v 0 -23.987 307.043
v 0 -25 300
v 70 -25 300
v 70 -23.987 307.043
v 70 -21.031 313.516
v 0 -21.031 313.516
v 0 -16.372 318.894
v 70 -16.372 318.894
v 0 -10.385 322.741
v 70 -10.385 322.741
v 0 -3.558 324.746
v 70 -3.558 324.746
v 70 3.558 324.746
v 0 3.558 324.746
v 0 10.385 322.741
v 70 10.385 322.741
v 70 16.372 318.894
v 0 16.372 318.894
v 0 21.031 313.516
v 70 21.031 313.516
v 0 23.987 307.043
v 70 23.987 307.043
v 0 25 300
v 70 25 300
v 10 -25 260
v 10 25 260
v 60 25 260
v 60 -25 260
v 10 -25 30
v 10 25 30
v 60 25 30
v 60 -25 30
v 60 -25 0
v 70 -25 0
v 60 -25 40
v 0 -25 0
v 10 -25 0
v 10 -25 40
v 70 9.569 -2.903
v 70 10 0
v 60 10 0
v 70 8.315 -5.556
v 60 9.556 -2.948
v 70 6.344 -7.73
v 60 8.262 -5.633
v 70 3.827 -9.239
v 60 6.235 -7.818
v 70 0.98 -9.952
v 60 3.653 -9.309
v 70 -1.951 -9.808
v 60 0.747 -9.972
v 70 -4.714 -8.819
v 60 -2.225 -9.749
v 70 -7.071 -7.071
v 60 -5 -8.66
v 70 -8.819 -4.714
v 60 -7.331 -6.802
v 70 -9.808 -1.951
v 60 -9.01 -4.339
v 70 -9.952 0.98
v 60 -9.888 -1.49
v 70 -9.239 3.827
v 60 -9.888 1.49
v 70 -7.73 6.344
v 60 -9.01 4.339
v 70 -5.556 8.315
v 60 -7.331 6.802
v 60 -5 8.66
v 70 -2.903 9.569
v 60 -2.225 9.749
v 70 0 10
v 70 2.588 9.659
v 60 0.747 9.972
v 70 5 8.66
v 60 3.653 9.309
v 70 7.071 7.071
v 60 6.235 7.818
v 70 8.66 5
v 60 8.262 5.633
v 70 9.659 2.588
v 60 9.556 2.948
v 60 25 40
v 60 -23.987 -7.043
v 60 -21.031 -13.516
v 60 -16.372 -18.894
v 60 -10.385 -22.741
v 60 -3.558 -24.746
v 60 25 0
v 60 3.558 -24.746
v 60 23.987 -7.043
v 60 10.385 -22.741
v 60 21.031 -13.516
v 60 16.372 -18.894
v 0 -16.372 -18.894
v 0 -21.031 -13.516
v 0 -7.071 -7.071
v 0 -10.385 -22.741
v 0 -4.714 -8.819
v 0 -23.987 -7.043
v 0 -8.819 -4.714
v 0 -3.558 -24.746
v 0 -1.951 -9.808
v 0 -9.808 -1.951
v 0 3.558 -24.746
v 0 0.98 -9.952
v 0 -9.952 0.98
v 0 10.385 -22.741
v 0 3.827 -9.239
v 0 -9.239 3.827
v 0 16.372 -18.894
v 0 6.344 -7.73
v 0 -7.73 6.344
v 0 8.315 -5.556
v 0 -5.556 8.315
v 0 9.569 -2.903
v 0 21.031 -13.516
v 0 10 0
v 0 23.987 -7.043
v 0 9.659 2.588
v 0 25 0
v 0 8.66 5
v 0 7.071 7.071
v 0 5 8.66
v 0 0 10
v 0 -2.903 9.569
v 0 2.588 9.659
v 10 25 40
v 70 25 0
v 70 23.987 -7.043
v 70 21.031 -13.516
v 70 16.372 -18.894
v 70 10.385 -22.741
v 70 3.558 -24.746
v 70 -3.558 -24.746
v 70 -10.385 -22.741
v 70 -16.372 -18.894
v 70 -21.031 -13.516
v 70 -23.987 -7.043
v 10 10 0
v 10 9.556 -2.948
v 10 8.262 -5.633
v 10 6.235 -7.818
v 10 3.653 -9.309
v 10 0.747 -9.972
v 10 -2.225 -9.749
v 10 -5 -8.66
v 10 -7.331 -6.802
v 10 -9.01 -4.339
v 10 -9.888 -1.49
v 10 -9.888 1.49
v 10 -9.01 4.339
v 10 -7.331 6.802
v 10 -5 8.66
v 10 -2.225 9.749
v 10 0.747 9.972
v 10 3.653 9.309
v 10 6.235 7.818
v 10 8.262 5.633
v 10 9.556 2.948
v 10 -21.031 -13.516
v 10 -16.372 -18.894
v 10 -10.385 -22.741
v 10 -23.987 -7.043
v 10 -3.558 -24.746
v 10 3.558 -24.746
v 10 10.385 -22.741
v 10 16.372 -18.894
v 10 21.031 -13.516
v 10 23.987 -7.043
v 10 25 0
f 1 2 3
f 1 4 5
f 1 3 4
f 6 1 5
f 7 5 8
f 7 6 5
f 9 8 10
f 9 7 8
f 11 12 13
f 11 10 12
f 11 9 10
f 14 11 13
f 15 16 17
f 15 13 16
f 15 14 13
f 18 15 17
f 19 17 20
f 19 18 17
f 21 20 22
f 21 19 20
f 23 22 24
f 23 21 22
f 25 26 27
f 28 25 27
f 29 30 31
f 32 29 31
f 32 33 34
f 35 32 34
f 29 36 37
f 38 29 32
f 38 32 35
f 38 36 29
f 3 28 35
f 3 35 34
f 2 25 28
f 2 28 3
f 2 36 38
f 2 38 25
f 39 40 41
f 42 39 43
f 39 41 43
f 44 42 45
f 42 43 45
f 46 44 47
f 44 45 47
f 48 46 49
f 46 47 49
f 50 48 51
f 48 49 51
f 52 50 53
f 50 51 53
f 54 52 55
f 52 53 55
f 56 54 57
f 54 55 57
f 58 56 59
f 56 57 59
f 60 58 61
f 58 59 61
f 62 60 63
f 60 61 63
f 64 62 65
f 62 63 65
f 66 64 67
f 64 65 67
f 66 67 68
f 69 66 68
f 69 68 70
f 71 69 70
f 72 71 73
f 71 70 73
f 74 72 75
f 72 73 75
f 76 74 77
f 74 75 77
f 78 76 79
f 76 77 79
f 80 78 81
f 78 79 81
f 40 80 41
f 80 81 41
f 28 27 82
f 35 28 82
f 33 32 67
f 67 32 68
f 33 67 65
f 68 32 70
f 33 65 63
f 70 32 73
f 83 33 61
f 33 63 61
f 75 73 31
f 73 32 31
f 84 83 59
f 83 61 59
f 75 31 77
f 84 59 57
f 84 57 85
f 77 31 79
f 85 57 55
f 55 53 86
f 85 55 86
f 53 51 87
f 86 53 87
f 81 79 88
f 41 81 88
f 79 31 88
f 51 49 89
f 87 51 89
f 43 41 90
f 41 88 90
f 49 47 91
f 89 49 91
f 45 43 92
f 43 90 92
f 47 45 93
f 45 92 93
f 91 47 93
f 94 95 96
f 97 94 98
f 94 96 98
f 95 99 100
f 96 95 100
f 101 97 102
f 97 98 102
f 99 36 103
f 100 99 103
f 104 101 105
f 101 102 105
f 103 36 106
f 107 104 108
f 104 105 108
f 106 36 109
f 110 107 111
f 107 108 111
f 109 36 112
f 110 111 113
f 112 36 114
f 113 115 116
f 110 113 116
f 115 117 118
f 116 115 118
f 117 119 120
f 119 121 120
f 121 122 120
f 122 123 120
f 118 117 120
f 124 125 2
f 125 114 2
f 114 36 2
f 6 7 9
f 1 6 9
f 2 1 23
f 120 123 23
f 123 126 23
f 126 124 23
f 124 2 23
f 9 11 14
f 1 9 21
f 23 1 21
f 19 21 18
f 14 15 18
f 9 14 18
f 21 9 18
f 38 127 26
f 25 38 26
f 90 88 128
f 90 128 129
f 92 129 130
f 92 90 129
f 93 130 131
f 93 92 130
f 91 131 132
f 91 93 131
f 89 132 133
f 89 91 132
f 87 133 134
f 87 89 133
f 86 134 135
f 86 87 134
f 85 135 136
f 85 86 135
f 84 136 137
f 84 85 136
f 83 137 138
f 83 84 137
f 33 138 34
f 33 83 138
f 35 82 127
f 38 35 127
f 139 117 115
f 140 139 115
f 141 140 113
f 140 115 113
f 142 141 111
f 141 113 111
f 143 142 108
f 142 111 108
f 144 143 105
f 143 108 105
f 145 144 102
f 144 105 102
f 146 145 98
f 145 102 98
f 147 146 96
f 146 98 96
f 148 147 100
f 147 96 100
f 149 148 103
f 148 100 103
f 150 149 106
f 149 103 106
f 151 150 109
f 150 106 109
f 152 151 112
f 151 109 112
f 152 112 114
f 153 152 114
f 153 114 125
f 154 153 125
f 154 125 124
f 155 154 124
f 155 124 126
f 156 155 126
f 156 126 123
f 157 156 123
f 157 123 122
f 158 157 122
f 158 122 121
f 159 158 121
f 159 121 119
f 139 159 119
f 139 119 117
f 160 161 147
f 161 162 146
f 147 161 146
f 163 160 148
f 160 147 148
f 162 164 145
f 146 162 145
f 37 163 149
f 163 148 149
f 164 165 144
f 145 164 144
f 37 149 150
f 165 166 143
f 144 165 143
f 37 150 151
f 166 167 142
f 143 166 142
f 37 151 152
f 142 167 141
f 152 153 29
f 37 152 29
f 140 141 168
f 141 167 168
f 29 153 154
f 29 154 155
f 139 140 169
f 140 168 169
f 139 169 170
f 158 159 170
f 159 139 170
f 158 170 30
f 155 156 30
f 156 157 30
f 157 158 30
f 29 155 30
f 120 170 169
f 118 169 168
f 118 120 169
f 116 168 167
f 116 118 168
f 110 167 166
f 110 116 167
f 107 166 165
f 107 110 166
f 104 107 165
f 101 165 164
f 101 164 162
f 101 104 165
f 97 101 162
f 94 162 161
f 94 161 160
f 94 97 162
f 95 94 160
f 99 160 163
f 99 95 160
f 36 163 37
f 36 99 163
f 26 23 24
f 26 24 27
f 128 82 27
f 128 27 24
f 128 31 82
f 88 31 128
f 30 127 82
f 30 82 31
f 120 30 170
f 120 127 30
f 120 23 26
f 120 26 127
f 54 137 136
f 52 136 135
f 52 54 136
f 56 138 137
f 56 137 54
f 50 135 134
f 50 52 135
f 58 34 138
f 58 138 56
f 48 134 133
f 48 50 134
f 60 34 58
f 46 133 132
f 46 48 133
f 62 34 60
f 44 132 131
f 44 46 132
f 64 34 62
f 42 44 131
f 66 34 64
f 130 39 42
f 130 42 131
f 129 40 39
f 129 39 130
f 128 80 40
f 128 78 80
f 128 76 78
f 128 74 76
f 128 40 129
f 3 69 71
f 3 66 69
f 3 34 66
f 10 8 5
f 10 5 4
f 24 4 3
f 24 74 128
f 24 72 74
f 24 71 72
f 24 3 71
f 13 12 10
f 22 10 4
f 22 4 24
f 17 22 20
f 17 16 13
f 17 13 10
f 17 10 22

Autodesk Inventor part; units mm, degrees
ref_plane "YZ Plane" through (0, 0, 0) normal (1, 0, 0) x (0, 1, 0)
ref_plane "XZ Plane" through (0, 0, 0) normal (0, 1, 0) x (-1, 0, 0)
ref_plane "XY Plane" through (0, 0, 0) normal (0, 0, 1) x (1, 0, 0)
sketch "Sketch1" plane through (0, 0, 0) normal (1, 0, 0) x (0, 1, 0)
  line L0 (0, 0) -> (0, 300)
  circle A0 centre (0, 300) radius 25
  circle A1 centre (0, 0) radius 25
  circle A2 centre (0, 300) radius 10
  circle A3 centre (0, 0) radius 10
  line L1 (25, 300) -> (25, 0)
  line L2 (-25, 0) -> (-25, 300)
  dimension "d0" = 300
  dimension "d1" = 50
  dimension "d2" = 20
extrude "Extrusion1" add sketch "Sketch1" along normal blind 70 contours A1 | A1 L2 A0 L0 | L0 A0 L1 A1 | A2 | A0
sketch "Sketch2" plane through (0, 25, 300) normal (0, 1, 0) x (1, 0, 0)
  line L0 (0, -25) -> (0, 0) projected
  line L1 (70, 300) -> (70, 325) projected
  line L2 (0, 0) -> (70, 0)
  line L3 (70, 0) -> (70, 300)
  line L4 (70, 300) -> (0, 300)
  line L5 (0, 300) -> (0, 0)
  line L6 (10, 10) -> (60, 10)
  line L7 (60, 10) -> (60, 290)
  line L8 (60, 290) -> (10, 290)
  line L9 (10, 290) -> (10, 10)
  line L10 (0, 325) -> (70, 325) projected
  line L11 (10, 290) -> (60, 290)
  line L12 (60, 290) -> (60, 325)
  line L13 (60, 325) -> (10, 325)
  line L14 (10, 325) -> (10, 290)
  line L15 (0, -25) -> (70, -25) projected
  line L16 (10, 10) -> (60, 10)
  line L17 (60, 10) -> (60, -25)
  line L18 (60, -25) -> (10, -25)
  line L19 (10, -25) -> (10, 10)
  line L20 (60, 260) -> (10, 260)
  line L21 (10, 260) -> (10, 40)
  line L22 (10, 40) -> (60, 40)
  line L23 (60, 40) -> (60, 260)
  line L24 (60, 325) -> (10, 325)
  line L25 (10, 325) -> (10, 270)
  line L26 (10, 270) -> (60, 270)
  line L27 (60, 270) -> (60, 325)
  line L28 (60, -25) -> (10, -25)
  line L29 (10, -25) -> (10, 30)
  line L30 (10, 30) -> (60, 30)
  line L31 (60, 30) -> (60, -25)
  point P0 (60, 40)
  point P1 (10, 260)
  point P2 (60, 270)
  dimension "d5" = 10
  dimension "d6" = 10
  dimension "d9" = 30
  dimension "d10" = 30
  dimension "d13" = 10
  dimension "d14" = 10
extrude "Extrusion2" cut sketch "Sketch2" against normal through all contours L14 L10 L12 L4 | L4 L12 L8 L14 | L8 L7 L26 L9
extrude "Extrusion3" cut sketch "Sketch2" against normal through all contours L9 L20 L7 L22
properties part number "arm2"
